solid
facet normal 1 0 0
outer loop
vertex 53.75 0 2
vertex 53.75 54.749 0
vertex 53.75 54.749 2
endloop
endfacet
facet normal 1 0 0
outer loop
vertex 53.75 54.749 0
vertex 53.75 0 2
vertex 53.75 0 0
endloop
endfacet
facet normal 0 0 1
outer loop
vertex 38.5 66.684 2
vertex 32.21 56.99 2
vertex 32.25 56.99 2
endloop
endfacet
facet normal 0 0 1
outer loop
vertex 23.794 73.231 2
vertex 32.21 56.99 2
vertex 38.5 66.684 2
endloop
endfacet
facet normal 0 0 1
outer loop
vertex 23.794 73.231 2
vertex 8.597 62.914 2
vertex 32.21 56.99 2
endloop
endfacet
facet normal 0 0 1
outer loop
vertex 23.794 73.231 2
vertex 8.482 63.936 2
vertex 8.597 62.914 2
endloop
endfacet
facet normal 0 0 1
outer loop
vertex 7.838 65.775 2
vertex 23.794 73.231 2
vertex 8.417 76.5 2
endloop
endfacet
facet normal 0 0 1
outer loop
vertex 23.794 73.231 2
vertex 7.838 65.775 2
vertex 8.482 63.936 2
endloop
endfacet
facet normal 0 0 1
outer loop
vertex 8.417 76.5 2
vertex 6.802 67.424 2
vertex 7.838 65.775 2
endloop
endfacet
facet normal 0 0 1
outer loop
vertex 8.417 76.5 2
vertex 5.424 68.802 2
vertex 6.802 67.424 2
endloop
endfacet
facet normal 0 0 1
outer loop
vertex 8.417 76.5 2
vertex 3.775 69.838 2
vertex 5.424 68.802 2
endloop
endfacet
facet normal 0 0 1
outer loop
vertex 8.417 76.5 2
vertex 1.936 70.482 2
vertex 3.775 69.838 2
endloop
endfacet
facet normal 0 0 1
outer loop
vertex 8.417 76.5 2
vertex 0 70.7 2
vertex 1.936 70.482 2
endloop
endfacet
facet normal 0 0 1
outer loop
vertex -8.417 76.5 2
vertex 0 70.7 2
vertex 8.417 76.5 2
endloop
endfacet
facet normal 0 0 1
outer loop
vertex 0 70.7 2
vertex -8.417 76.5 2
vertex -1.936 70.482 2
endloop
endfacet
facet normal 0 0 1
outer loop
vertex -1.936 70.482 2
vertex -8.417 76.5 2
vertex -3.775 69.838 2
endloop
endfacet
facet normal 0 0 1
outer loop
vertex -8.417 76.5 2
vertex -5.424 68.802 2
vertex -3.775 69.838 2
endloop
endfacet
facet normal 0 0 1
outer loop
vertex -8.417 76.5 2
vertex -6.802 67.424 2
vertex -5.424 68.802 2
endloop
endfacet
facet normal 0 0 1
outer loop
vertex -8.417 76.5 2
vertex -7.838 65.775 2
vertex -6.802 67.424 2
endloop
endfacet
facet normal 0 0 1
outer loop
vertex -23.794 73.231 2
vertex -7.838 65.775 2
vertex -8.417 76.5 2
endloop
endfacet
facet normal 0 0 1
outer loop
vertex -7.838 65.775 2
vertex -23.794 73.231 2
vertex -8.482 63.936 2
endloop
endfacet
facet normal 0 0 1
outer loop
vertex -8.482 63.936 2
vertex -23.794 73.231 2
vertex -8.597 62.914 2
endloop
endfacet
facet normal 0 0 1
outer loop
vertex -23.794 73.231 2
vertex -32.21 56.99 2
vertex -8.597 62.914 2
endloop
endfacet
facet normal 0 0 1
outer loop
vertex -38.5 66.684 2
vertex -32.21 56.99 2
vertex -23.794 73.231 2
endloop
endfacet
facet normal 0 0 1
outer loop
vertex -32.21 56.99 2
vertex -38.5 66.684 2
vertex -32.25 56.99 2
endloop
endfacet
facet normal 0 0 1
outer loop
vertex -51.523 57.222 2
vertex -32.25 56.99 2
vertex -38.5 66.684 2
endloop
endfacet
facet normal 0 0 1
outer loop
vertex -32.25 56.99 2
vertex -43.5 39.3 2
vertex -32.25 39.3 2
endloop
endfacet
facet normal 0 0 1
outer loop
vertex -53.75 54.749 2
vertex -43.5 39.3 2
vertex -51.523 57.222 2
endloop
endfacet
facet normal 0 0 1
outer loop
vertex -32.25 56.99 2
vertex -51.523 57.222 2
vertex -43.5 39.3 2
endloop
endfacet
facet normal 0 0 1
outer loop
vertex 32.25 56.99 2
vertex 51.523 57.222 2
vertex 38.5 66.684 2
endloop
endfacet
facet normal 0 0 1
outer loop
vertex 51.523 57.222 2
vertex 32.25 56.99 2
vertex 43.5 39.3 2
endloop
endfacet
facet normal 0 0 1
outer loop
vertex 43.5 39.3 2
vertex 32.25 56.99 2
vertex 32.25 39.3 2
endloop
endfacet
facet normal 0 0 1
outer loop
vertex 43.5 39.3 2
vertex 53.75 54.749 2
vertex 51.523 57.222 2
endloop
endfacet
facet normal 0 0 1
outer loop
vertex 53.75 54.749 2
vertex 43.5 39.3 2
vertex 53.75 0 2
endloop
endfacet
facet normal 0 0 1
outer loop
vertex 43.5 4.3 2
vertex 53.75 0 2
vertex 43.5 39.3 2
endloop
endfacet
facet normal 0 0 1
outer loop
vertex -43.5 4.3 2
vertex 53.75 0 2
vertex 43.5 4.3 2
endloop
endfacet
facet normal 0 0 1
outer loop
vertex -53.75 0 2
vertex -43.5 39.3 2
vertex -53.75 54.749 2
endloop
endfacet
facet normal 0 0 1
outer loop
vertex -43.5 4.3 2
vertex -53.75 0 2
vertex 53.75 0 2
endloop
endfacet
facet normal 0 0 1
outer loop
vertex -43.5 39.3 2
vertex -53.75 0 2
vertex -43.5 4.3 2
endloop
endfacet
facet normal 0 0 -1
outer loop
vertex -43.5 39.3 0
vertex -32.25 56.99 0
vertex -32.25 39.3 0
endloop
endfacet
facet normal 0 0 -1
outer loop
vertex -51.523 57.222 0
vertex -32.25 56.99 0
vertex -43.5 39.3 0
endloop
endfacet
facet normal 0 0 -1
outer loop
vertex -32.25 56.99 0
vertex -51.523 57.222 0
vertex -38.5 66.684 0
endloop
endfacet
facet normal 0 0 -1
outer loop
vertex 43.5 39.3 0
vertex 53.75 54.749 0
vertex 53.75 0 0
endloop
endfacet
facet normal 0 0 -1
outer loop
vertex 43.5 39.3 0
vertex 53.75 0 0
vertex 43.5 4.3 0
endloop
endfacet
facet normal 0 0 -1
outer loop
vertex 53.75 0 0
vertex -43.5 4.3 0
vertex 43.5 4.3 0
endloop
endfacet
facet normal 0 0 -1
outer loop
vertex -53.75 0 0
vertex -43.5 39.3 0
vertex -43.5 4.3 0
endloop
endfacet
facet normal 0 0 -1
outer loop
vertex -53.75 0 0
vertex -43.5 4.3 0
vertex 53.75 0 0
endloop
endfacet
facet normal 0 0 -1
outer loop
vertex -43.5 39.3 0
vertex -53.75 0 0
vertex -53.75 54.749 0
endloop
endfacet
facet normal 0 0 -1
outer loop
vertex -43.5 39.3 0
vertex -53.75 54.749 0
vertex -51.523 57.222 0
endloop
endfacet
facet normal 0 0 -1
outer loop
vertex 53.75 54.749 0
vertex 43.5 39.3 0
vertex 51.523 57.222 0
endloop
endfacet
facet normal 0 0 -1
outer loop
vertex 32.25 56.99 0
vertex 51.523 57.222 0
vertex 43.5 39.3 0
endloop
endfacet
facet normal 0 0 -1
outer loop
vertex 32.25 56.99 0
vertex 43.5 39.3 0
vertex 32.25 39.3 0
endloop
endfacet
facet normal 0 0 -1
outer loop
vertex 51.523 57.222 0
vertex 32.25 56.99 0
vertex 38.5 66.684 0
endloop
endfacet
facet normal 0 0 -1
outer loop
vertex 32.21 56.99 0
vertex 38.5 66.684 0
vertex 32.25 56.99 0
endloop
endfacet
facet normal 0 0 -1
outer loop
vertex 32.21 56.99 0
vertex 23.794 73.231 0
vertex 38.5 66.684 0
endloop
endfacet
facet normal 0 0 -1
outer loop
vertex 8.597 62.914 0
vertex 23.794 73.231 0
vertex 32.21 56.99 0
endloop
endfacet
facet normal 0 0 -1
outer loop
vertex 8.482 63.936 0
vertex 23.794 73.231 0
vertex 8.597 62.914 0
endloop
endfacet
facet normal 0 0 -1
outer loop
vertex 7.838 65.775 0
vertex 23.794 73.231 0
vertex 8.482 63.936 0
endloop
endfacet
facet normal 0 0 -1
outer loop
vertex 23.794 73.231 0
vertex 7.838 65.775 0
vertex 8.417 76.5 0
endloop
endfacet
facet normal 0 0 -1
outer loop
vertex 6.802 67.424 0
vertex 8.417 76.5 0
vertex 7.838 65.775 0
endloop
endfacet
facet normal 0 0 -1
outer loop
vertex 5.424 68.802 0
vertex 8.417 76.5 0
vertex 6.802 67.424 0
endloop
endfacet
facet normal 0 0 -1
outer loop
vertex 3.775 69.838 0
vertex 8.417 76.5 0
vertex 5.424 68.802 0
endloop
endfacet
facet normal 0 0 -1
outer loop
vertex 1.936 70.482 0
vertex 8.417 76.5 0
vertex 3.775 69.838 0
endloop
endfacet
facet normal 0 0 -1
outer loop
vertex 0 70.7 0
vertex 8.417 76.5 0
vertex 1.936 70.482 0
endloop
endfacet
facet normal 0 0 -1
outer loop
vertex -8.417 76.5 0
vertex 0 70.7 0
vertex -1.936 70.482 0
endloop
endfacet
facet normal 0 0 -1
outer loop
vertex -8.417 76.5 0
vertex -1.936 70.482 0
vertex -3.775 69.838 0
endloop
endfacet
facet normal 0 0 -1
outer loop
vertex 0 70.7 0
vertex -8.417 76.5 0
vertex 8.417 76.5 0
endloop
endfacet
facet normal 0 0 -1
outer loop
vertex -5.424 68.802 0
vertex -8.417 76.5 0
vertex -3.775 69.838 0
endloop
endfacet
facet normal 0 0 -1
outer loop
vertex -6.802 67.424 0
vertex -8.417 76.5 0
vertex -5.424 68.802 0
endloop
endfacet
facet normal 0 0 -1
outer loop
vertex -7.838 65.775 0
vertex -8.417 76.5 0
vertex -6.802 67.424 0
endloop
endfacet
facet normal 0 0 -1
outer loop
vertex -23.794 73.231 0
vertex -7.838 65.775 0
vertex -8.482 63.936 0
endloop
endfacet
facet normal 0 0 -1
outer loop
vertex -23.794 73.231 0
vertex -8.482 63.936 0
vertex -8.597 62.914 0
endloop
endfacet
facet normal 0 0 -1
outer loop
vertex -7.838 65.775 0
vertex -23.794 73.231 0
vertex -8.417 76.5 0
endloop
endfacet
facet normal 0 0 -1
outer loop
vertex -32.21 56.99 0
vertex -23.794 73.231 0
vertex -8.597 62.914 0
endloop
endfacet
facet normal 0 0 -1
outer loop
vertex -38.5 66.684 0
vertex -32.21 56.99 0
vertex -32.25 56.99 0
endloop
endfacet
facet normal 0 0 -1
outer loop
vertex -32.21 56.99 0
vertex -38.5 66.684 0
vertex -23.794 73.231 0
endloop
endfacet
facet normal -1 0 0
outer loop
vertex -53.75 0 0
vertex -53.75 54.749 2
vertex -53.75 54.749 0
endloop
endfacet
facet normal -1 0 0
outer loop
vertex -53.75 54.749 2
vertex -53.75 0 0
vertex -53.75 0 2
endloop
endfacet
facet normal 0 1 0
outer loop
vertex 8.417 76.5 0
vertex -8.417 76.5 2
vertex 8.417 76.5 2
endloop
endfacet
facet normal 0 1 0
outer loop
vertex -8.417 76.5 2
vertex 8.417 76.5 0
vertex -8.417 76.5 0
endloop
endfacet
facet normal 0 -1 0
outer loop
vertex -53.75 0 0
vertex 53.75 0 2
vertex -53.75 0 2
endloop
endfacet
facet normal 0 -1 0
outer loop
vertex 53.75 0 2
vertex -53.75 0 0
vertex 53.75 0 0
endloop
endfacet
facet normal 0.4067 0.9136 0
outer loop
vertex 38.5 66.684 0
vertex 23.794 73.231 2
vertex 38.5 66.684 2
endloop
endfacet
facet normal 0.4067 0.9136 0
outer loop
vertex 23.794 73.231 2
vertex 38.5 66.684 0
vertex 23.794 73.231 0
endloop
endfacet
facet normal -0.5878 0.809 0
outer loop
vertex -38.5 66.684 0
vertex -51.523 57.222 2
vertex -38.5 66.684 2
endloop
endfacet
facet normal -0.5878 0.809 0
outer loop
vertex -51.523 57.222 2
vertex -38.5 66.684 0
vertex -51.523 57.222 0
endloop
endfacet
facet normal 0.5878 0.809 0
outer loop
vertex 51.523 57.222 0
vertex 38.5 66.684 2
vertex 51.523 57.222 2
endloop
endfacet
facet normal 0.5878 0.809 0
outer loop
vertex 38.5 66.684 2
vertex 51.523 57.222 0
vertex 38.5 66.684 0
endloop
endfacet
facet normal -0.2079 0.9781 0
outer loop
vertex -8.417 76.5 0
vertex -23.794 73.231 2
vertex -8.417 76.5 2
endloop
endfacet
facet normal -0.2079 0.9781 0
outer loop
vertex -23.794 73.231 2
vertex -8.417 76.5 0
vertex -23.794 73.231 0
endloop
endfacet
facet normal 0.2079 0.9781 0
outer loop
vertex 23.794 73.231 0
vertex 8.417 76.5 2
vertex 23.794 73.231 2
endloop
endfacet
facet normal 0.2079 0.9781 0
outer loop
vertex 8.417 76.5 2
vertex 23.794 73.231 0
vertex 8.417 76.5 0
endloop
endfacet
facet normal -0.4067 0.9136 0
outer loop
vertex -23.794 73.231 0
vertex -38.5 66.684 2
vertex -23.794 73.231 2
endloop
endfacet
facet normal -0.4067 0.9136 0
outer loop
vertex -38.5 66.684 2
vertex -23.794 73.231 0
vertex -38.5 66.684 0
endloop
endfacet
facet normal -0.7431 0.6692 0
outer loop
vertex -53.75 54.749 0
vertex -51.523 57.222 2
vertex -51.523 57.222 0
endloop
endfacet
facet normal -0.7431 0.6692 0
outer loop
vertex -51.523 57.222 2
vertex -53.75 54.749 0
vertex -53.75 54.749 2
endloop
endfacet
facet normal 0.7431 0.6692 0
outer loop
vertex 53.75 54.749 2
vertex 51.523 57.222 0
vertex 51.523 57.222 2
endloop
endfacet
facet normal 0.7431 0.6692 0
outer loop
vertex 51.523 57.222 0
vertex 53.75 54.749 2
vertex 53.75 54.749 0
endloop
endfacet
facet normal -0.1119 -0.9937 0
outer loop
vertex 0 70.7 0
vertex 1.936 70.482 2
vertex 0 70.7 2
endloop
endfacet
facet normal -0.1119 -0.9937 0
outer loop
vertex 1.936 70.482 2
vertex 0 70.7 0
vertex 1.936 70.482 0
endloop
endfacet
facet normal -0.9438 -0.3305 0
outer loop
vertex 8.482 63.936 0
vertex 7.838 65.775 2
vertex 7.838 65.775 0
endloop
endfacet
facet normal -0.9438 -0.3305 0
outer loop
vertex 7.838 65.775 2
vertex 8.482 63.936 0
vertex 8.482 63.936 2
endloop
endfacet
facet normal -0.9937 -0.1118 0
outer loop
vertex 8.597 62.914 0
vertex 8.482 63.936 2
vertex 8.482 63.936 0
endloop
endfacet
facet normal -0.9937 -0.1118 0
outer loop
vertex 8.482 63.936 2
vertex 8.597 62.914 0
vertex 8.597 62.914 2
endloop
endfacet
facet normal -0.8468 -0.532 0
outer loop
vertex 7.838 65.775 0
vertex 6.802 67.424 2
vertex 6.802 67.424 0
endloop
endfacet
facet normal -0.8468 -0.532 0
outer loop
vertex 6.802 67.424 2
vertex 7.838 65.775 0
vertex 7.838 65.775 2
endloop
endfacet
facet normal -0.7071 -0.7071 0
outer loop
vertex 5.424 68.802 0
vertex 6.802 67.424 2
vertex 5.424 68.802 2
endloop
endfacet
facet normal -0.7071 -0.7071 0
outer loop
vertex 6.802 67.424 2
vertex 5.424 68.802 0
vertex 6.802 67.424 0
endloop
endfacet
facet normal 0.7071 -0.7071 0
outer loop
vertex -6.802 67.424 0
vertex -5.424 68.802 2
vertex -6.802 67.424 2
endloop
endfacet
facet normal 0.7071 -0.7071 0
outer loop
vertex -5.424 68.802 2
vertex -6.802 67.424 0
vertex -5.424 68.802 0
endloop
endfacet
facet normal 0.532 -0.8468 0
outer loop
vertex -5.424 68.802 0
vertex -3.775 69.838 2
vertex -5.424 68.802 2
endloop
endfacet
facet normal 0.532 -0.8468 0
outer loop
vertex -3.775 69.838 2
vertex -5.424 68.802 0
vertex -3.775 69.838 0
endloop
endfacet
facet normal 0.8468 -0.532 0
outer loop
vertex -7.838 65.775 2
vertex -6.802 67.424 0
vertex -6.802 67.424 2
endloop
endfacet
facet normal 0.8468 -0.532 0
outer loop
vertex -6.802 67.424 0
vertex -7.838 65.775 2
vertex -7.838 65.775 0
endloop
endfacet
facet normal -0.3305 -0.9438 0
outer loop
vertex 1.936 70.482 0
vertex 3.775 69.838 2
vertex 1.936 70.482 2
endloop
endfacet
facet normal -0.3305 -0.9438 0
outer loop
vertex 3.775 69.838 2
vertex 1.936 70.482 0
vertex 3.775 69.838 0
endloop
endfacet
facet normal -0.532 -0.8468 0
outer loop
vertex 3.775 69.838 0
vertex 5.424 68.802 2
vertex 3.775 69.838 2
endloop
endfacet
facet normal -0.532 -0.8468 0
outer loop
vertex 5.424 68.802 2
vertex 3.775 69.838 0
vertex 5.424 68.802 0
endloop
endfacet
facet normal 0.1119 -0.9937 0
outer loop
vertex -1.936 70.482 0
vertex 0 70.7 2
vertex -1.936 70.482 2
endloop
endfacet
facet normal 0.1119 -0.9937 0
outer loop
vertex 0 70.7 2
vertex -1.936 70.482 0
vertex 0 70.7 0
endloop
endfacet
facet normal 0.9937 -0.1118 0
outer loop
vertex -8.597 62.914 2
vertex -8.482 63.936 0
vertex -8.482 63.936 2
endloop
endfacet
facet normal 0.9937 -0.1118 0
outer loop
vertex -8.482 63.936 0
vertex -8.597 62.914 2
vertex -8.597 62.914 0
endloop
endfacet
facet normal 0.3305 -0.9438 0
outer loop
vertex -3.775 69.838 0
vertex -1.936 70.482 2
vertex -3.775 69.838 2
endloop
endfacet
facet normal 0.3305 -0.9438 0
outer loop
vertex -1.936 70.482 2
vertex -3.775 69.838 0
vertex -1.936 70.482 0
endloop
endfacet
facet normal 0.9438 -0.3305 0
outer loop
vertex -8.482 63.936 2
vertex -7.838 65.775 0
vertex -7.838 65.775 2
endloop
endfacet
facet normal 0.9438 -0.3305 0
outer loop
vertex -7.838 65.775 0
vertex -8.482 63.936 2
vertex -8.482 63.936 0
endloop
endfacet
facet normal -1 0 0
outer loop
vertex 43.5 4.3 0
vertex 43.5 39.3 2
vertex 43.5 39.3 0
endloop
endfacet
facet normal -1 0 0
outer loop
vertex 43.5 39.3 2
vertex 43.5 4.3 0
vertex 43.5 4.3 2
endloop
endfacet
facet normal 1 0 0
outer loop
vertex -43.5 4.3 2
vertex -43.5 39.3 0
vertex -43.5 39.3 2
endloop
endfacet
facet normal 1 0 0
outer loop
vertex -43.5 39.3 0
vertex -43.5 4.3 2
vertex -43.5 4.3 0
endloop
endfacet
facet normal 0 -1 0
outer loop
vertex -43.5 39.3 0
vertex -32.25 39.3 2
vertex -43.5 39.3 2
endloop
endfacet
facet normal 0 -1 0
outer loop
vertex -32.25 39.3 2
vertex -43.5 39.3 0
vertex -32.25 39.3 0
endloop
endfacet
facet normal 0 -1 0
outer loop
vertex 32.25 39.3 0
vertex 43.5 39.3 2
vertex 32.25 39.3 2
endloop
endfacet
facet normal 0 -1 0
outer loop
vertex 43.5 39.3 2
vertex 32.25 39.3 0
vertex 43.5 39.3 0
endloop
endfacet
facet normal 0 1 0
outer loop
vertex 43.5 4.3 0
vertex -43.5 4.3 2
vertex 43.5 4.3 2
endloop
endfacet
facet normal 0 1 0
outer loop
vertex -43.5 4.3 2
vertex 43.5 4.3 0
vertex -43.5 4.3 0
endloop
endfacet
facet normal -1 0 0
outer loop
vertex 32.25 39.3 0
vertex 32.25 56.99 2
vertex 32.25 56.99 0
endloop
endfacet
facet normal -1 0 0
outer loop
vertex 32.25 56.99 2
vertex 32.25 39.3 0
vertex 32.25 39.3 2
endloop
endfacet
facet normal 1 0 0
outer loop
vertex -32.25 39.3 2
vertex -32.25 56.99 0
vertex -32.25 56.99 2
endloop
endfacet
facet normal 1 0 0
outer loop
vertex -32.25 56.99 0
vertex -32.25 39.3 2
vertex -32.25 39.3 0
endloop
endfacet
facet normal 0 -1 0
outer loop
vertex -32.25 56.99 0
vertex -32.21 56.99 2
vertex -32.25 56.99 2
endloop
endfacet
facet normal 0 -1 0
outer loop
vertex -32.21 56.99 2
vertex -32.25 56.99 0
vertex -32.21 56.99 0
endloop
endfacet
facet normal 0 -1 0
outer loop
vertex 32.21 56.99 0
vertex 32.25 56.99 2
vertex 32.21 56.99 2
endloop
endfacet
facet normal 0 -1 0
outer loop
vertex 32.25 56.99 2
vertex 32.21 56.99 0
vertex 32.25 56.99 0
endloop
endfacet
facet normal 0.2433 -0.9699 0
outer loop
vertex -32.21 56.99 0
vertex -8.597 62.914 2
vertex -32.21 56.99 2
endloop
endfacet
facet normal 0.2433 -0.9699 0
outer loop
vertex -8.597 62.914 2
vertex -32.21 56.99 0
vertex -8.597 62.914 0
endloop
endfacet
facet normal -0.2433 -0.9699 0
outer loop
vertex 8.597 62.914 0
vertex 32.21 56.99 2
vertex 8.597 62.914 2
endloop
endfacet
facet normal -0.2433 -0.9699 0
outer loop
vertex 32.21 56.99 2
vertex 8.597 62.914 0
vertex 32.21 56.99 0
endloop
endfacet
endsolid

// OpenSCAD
// ankle front
// measures are in mm
// copied and adapted from the blueprints of CS:R from R2 Builders Club

h = 2;
c = 1;

module triangle(l, w, h) {
  CubePoints = [
    [0, 0, 0], // 0
    [l, 0, 0], // 1
    [l, w, 0], // 2
    [0, 0, h], // 3
    [l, 0, h], // 4
    [l, w, h], // 5
    ];

  CubeFaces = [
    [0, 1, 2], // bottom
    [0, 3, 4, 1], // front
    [5, 4, 3], // top
    [1, 4, 5, 2], // right
    [2, 5, 3, 0], // back, left
    ]; // left

  polyhedron(CubePoints, CubeFaces);
}

module the_triangle() {
  translate([-64.5/2, 4.3+35+17.7-0.02, 0])
    triangle(64.5/2-8.7/2, 7, h);
}

module outer() {
  intersection() {
    translate([-107.5/2,0,0])
      cube(size=[107.5,76.5,h]);

    cylinder(h, 77, 77);
  }
}

module inner() {
  translate([0, 62, 0])
    cylinder(h, 8.7, 8.7);

  translate([-87/2, 4.3, 0])
    cube(size=[87, 35, h]);

  translate([-64.5/2, 4.3+35-0.01, 0])
    cube(size=[64.5, 17.7, h]);

  the_triangle();
  mirror([1, 0, 0])
    the_triangle();
}

module all() {
  difference() {
    outer();
    inner();
  }
}

all();
